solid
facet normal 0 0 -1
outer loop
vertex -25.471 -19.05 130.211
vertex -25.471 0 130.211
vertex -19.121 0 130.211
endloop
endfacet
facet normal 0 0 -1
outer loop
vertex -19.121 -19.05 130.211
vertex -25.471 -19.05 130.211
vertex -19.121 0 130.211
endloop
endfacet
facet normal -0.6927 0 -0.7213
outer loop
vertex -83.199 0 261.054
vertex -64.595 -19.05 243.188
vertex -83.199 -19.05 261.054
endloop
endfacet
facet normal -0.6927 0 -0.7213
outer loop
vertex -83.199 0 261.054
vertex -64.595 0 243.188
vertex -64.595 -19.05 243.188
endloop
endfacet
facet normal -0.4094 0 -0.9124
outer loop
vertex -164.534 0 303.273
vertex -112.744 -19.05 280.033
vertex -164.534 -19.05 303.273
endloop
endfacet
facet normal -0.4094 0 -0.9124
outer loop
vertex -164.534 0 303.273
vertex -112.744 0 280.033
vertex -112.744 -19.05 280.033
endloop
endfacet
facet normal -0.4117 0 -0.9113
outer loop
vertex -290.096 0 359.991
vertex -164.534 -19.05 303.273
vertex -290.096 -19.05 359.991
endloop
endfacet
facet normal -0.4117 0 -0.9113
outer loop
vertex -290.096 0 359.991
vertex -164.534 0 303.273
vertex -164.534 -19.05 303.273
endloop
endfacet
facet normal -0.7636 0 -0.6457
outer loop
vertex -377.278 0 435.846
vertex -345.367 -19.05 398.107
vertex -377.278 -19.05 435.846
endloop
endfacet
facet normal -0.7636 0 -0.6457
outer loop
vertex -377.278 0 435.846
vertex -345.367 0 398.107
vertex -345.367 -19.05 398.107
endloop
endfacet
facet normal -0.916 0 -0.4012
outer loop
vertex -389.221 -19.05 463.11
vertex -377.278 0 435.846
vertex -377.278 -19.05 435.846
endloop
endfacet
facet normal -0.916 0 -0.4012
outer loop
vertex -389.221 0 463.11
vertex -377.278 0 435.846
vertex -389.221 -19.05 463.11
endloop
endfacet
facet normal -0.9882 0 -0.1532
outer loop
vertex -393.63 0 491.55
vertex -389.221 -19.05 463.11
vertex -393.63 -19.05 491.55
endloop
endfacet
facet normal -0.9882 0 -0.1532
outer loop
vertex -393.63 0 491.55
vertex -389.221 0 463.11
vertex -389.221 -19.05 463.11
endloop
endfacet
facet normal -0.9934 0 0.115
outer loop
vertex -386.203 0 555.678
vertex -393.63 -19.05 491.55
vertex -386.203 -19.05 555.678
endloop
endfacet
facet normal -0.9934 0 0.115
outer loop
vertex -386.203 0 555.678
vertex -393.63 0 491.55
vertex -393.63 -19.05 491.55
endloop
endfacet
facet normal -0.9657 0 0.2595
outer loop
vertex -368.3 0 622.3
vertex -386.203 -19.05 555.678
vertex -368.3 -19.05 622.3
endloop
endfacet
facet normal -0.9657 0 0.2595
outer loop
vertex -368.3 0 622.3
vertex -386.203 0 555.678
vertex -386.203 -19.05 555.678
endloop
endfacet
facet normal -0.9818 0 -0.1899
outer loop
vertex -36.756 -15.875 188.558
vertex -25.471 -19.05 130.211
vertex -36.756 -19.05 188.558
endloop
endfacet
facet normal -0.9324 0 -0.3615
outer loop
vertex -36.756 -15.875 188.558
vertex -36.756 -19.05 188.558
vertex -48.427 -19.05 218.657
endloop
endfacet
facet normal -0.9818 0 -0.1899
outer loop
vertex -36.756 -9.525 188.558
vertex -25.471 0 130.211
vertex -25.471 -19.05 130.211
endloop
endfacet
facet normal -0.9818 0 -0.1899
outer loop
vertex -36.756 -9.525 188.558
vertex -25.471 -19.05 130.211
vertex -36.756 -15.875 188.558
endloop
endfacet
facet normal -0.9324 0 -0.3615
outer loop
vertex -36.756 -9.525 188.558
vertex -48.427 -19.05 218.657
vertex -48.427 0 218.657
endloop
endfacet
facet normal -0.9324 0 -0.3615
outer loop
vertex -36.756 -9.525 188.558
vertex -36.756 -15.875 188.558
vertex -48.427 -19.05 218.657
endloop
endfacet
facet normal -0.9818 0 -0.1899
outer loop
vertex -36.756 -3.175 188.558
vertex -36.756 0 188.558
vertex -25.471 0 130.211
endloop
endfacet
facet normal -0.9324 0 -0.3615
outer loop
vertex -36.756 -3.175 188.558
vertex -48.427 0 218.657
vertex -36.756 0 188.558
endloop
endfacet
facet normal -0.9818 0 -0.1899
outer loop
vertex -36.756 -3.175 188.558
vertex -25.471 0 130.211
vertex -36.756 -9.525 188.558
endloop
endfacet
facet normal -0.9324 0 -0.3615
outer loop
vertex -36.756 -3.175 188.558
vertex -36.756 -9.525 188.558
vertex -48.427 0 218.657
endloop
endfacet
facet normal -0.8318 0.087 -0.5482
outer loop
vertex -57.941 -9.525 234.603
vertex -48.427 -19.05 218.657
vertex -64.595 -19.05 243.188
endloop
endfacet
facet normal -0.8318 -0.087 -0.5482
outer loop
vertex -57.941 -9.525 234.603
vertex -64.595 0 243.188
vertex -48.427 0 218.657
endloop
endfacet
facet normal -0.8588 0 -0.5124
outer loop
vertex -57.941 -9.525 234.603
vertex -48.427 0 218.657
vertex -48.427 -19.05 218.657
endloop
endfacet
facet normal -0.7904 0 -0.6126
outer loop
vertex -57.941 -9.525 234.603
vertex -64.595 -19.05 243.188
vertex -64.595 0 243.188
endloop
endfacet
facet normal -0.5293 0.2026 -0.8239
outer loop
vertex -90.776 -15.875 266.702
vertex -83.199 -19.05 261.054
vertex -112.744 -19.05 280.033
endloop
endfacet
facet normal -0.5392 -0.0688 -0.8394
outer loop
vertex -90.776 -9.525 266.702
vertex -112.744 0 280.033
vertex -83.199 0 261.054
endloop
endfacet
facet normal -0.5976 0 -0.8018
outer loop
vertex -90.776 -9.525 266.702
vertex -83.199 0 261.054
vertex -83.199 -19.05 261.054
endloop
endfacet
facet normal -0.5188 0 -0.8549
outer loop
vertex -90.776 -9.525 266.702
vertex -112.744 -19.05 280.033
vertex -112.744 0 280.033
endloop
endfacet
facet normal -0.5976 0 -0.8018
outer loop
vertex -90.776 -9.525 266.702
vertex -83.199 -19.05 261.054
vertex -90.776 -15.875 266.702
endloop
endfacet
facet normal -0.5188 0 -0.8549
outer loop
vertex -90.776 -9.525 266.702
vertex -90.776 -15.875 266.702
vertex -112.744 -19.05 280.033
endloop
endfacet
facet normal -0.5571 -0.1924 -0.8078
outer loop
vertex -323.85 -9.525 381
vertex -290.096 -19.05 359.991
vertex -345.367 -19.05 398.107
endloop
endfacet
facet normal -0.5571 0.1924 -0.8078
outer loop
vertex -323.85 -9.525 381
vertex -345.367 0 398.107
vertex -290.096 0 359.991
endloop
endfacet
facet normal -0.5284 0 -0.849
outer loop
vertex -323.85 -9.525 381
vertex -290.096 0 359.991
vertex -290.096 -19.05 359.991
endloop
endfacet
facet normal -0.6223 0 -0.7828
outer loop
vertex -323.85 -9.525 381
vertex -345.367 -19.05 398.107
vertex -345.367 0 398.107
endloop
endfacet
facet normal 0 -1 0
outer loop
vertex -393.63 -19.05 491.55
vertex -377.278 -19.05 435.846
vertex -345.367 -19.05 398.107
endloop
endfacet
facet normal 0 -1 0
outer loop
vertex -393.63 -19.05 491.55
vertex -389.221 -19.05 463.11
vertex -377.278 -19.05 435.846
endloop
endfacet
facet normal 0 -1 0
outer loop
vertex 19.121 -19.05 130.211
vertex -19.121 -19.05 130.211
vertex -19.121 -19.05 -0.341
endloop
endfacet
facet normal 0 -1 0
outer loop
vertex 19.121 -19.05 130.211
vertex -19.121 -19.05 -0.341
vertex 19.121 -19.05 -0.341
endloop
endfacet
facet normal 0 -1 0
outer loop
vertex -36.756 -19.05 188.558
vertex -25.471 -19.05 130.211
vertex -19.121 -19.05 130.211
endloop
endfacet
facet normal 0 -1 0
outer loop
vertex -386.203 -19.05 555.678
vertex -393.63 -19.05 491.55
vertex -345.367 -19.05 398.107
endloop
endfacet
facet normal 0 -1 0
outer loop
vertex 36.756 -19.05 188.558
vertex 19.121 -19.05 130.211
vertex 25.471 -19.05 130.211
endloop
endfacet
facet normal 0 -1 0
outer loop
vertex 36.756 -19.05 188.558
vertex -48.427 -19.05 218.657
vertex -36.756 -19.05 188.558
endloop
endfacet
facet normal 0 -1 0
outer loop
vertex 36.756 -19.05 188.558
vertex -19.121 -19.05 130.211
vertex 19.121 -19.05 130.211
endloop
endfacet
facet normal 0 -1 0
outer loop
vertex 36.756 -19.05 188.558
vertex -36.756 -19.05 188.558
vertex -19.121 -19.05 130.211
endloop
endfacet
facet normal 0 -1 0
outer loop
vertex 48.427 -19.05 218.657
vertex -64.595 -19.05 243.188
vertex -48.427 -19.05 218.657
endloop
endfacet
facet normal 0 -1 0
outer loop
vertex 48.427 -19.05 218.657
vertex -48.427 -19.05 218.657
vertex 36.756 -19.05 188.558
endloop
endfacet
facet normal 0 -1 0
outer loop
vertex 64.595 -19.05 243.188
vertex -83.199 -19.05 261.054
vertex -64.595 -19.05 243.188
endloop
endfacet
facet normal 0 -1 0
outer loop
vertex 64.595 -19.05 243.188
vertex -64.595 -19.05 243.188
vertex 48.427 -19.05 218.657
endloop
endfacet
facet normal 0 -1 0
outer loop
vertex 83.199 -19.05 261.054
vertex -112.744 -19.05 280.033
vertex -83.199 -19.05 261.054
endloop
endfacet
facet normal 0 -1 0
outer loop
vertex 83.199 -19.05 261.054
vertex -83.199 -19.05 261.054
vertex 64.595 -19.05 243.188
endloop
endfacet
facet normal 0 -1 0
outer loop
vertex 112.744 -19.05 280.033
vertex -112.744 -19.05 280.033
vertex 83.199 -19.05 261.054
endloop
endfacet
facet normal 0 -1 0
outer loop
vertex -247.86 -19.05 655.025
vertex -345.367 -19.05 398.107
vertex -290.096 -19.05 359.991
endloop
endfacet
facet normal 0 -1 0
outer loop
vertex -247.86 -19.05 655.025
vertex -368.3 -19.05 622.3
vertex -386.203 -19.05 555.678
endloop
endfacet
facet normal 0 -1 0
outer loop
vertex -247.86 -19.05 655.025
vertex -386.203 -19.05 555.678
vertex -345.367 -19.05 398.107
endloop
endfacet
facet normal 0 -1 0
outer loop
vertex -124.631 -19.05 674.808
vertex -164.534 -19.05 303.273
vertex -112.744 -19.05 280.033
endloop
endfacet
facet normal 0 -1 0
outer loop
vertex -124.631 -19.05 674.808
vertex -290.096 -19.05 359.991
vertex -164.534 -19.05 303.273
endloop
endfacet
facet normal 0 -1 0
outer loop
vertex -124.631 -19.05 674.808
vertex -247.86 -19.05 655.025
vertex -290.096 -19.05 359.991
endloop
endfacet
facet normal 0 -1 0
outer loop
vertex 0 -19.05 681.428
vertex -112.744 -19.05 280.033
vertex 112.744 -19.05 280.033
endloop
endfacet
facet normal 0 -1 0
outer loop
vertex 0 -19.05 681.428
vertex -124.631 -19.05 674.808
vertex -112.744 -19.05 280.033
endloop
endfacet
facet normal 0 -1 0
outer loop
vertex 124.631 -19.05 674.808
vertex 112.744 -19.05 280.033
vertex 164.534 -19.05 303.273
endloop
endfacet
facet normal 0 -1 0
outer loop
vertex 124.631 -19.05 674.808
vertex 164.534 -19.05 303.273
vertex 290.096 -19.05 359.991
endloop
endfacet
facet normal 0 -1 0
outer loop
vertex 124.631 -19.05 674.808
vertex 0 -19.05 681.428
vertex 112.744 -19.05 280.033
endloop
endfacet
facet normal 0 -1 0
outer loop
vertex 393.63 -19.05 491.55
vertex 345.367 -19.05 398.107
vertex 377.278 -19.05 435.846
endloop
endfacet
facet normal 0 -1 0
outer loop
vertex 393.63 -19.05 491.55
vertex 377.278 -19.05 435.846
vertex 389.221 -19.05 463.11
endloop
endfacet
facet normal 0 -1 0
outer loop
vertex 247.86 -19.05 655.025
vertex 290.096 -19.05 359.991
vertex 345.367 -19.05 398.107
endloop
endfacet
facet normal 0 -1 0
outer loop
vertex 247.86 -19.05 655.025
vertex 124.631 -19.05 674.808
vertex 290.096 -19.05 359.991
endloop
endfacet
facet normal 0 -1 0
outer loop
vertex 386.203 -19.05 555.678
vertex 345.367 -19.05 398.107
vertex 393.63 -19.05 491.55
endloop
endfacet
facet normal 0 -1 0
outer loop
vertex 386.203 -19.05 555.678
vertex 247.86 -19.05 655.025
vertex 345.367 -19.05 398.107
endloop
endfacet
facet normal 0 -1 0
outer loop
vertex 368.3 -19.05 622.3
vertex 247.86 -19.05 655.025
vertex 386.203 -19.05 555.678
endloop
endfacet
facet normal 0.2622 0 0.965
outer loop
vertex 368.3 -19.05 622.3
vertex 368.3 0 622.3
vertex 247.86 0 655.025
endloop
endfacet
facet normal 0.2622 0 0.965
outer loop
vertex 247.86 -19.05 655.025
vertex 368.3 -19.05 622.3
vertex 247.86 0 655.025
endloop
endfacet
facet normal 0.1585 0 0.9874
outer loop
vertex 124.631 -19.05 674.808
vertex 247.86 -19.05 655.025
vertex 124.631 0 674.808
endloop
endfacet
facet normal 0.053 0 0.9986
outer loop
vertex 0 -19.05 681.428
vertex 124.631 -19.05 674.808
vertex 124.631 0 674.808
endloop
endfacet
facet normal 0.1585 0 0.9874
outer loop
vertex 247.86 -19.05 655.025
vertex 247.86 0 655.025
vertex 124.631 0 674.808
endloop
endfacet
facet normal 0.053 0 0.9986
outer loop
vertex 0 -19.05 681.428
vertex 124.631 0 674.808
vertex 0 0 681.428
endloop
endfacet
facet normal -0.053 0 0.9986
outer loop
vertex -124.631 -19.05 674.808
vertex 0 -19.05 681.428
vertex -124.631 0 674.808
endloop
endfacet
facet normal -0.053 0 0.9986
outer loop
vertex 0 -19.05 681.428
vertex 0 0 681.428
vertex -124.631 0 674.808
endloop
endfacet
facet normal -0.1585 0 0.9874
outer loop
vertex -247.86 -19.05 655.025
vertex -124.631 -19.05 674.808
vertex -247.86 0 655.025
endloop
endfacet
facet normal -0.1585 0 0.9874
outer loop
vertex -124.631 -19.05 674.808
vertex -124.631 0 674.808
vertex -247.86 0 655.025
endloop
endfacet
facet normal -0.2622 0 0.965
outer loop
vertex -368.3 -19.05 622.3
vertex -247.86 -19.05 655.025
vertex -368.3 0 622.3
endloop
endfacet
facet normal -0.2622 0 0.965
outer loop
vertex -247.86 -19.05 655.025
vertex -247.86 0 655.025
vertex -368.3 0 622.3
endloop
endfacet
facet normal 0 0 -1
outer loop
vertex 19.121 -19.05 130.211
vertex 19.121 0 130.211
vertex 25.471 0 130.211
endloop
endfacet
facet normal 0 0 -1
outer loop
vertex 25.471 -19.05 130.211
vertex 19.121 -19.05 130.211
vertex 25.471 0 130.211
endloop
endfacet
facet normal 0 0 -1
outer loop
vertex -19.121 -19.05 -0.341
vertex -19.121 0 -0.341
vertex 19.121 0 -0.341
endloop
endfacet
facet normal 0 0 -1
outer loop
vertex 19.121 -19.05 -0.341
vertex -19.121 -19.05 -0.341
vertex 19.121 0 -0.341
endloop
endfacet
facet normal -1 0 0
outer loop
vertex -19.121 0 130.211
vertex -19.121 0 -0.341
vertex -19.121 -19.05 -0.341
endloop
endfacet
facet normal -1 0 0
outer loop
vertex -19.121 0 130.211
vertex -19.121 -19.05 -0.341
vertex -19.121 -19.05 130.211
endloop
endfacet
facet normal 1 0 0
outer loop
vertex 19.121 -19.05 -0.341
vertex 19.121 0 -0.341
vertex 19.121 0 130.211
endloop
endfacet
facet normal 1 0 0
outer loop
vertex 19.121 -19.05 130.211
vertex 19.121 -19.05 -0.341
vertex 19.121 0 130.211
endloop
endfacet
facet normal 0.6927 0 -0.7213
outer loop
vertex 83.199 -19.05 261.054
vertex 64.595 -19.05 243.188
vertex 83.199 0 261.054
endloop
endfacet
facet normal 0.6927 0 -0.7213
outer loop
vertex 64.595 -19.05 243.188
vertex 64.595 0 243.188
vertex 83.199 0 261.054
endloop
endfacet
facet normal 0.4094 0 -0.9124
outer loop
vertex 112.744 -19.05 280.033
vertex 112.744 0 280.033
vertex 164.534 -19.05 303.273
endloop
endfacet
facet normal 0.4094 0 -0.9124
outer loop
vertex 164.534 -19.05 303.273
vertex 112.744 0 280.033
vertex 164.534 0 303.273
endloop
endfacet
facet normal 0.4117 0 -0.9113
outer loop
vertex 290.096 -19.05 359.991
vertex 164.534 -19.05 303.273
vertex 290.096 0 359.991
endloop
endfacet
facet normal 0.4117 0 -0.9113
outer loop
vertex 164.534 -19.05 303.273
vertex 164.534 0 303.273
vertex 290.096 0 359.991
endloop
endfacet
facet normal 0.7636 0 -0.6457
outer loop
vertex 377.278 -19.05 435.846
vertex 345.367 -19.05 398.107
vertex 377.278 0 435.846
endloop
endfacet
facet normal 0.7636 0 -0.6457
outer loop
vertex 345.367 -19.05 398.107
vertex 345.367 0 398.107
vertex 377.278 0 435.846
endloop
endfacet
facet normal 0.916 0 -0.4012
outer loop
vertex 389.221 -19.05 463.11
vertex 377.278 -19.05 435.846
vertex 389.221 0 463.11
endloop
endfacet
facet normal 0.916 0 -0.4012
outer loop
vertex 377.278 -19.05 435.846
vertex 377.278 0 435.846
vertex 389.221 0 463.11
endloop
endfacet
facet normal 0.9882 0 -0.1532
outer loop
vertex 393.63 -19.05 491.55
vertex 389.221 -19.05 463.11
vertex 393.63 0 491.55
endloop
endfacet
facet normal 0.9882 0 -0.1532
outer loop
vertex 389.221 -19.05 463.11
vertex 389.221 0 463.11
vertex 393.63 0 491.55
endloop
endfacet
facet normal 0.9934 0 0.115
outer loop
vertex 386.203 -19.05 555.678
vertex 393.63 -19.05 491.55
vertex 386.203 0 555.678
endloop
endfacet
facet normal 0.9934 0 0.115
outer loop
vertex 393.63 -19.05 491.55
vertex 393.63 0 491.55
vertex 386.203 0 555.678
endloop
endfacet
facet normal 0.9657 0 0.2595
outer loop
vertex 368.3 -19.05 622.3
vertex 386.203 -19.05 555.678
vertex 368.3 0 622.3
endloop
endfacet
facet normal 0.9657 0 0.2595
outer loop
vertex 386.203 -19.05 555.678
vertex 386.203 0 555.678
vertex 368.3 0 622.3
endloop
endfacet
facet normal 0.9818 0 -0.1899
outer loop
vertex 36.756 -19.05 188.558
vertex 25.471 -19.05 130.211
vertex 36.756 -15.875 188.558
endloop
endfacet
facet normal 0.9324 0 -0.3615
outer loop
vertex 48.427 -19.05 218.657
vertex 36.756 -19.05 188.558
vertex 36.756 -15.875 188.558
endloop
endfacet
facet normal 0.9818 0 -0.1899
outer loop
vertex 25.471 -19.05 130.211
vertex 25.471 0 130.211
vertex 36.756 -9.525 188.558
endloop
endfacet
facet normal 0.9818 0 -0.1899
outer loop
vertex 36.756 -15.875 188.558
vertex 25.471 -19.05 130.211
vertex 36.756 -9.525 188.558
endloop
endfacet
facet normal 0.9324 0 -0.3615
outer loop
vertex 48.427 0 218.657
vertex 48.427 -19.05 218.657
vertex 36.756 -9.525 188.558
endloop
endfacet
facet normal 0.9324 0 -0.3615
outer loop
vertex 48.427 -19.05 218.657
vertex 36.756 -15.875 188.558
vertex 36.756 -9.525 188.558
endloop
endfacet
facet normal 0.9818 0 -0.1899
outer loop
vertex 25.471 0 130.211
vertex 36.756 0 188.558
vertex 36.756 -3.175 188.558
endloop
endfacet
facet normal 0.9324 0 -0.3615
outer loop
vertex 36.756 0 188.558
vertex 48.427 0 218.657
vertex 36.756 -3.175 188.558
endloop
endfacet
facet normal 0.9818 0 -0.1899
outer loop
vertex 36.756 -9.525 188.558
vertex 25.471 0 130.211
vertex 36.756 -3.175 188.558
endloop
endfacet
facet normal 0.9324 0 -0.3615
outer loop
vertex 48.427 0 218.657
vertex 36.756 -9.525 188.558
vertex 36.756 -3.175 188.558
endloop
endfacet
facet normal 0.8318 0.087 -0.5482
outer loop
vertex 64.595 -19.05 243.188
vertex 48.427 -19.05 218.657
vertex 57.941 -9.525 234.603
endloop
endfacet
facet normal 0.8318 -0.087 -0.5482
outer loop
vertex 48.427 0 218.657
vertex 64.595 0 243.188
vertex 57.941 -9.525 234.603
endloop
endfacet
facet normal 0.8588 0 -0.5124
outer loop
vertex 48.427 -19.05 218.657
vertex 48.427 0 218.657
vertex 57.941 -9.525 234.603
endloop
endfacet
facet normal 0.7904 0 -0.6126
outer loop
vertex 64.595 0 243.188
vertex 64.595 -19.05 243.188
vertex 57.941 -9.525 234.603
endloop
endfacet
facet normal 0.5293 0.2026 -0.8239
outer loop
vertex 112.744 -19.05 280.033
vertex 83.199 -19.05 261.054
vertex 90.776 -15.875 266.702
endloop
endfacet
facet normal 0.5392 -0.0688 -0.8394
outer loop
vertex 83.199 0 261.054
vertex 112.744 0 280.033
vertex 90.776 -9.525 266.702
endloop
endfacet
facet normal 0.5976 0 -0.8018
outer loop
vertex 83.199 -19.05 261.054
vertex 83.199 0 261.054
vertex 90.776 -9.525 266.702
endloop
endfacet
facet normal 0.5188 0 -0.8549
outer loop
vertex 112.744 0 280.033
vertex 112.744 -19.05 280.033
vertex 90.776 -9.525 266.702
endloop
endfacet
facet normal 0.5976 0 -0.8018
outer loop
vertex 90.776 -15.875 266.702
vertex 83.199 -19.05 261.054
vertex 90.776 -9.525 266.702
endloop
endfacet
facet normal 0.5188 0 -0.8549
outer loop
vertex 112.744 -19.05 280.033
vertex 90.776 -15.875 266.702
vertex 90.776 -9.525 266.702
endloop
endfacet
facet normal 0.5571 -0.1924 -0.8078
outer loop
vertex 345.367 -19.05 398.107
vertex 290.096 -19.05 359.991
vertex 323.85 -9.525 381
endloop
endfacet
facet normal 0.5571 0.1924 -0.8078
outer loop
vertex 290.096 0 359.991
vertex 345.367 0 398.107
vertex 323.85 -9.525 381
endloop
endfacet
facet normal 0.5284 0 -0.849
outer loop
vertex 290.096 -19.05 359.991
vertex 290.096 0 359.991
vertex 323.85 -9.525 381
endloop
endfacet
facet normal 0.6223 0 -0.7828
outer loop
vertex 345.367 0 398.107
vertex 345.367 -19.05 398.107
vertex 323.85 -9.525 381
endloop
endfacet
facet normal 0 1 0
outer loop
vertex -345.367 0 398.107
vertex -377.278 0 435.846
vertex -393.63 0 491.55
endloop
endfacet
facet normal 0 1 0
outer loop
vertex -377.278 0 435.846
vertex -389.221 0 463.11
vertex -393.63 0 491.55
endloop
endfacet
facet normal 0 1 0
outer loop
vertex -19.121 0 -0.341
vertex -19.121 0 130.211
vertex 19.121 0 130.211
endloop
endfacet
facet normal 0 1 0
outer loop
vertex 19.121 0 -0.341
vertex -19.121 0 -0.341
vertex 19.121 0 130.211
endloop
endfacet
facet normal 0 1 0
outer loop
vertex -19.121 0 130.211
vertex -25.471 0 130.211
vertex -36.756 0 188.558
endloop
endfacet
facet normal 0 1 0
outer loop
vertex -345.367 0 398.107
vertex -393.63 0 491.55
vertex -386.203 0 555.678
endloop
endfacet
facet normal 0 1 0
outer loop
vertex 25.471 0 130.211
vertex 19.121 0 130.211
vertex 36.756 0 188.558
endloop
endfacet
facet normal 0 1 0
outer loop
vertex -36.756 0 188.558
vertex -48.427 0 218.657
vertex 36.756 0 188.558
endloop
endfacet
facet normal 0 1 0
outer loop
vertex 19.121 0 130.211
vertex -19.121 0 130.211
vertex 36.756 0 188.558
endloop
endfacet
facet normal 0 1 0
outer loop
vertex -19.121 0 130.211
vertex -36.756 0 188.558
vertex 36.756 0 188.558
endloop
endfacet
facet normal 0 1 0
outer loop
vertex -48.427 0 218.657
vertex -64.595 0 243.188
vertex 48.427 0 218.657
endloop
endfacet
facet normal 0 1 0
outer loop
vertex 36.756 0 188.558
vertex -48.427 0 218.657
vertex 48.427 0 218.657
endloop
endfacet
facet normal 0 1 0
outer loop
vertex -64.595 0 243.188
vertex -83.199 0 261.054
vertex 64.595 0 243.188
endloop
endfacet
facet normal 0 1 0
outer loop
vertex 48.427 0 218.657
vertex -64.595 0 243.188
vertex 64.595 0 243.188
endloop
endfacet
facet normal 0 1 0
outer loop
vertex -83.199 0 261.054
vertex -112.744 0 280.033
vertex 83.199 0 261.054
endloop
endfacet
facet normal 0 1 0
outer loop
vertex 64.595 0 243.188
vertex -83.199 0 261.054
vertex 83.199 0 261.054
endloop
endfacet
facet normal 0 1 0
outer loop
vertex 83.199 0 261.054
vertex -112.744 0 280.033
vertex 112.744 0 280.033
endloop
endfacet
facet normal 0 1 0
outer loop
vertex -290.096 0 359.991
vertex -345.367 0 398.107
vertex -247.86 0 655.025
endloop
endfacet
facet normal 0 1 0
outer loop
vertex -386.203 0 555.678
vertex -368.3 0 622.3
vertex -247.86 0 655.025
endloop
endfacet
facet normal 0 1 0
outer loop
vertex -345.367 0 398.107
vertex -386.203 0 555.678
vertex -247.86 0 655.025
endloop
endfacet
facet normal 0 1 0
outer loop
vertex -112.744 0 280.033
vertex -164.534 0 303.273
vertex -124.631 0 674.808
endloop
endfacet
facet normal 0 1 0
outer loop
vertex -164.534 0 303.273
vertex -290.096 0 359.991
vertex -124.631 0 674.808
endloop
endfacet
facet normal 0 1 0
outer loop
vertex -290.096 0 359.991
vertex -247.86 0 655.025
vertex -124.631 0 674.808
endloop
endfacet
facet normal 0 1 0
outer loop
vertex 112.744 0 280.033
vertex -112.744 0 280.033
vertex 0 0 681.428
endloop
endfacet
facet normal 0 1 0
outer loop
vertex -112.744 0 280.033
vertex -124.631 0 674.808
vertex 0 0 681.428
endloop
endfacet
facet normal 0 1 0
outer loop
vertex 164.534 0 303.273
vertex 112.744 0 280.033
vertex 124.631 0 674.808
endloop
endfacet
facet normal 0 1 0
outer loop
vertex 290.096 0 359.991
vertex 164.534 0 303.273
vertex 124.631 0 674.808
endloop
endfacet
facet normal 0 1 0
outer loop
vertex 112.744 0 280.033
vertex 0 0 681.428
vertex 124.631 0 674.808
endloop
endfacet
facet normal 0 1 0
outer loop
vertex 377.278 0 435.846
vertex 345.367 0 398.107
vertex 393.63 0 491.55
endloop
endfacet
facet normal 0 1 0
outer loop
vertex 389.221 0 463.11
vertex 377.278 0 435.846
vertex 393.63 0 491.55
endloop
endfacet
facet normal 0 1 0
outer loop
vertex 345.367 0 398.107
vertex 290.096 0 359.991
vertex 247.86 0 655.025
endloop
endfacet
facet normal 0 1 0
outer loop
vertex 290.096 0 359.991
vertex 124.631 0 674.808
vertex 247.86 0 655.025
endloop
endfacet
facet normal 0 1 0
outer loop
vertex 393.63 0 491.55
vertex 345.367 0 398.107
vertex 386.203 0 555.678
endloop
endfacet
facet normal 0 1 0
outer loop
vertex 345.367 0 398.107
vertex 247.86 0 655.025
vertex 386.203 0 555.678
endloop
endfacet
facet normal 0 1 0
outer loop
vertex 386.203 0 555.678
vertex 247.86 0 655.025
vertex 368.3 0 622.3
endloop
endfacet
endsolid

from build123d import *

# Parameters (mm, degrees)
F0_W     = 38.2413167982
F0_H     = 130.5519748793
F1_DEPTH = 19.05


with BuildPart() as f1:
    # F0 (on Front) → F1 (new body)
    with BuildSketch(Plane.XZ):
        with Locations((-5e-10, 64.9347287138)):
            Rectangle(F0_W, F0_H)
        with BuildLine():
            Line((-19.1206583996, 130.2107161535), (19.1206583986, 130.2107161535))
            Line((19.1206583986, 130.2107161535), (25.4706583986, 130.2107161535))
            add(Edge.make_bspline(
                [(25.4706583986, 130.2107161535), (30.0724719756, 169.0966659039), (51.3980125218, 257.0949252577), (168.2834825455, 304.8190286771), (326.925094009, 369.4938490194), (396.8974330576, 452.268946401), (393.7810574923, 535.008276766), (377.0494931199, 592.3264271799), (368.2999999833, 622.3000000618)],
                knots=[0.1131891299, 0.1131891299, 0.1131891299, 0.1131891299, 0.2225944071, 0.3940346608, 0.5865569639, 0.732236582, 0.8599775765, 1, 1, 1, 1], degree=3))
            ThreePointArc((368.2999999833, 622.3000000618), (-1.67e-08, 681.4277668685), (-368.3000000167, 622.3000000618))
            add(Edge.make_bspline(
                [(-25.4706584275, 130.2107161535), (-30.0724720137, 169.0966658909), (-51.3980125817, 257.094925206), (-168.2834825322, 304.8190286898), (-326.9250939954, 369.4938490451), (-396.8974330089, 452.2689464188), (-393.781057464, 535.008276759), (-377.0494931536, 592.3264271786), (-368.3000000167, 622.3000000618)],
                knots=[0.1131891299, 0.1131891299, 0.1131891299, 0.1131891299, 0.222594407, 0.3940346608, 0.5865569639, 0.7322365819, 0.8599775765, 1, 1, 1, 1], degree=3))
            Line((-25.4706584275, 130.2107161535), (-19.1206583996, 130.2107161535))
        make_face()
    extrude(amount=F1_DEPTH)


solid = f1.part
